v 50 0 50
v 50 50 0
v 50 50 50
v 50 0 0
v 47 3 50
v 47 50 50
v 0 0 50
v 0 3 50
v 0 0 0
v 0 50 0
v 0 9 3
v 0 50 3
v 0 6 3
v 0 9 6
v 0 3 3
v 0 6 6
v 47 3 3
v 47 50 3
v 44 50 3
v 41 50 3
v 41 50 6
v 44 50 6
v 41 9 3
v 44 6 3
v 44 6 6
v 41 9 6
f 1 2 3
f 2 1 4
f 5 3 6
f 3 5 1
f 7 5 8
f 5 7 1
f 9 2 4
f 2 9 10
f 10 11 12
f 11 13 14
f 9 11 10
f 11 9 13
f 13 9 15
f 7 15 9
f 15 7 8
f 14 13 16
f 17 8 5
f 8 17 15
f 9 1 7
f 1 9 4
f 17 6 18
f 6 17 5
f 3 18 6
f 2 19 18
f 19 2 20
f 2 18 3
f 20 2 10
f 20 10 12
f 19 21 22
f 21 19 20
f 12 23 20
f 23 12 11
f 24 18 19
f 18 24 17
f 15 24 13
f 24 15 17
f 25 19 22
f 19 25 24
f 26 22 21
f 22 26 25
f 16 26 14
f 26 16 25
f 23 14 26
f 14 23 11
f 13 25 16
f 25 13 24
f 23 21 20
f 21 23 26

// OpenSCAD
wallWidth = 3;
totalWidth = 50;
totalHeight = 50;
totalDepth = 50;

// pared trasera
cube([totalWidth,wallWidth,totalHeight]);
// pared lateral
translate([totalWidth,0,0])
    rotate([0,0,90])
        cube([totalDepth,wallWidth,totalHeight]);
// base
translate([0,totalDepth,0])
    rotate([90, 0, 0])
        cube([totalWidth,
              wallWidth,
              totalDepth]);
// canaleta trasera
translate([0,
           wallWidth*2,
           wallWidth*2])
    rotate([0,90,0])
        cube([wallWidth, 
              wallWidth, 
              totalWidth - 2 * wallWidth]);
// canaleta lateral
translate([totalWidth - 3*wallWidth,
           totalDepth,
           wallWidth])
    rotate([90,0,0])
        cube([wallWidth, 
              wallWidth, 
              totalDepth - (2 * wallWidth)]);
//relleno canaletas
cube(3);
